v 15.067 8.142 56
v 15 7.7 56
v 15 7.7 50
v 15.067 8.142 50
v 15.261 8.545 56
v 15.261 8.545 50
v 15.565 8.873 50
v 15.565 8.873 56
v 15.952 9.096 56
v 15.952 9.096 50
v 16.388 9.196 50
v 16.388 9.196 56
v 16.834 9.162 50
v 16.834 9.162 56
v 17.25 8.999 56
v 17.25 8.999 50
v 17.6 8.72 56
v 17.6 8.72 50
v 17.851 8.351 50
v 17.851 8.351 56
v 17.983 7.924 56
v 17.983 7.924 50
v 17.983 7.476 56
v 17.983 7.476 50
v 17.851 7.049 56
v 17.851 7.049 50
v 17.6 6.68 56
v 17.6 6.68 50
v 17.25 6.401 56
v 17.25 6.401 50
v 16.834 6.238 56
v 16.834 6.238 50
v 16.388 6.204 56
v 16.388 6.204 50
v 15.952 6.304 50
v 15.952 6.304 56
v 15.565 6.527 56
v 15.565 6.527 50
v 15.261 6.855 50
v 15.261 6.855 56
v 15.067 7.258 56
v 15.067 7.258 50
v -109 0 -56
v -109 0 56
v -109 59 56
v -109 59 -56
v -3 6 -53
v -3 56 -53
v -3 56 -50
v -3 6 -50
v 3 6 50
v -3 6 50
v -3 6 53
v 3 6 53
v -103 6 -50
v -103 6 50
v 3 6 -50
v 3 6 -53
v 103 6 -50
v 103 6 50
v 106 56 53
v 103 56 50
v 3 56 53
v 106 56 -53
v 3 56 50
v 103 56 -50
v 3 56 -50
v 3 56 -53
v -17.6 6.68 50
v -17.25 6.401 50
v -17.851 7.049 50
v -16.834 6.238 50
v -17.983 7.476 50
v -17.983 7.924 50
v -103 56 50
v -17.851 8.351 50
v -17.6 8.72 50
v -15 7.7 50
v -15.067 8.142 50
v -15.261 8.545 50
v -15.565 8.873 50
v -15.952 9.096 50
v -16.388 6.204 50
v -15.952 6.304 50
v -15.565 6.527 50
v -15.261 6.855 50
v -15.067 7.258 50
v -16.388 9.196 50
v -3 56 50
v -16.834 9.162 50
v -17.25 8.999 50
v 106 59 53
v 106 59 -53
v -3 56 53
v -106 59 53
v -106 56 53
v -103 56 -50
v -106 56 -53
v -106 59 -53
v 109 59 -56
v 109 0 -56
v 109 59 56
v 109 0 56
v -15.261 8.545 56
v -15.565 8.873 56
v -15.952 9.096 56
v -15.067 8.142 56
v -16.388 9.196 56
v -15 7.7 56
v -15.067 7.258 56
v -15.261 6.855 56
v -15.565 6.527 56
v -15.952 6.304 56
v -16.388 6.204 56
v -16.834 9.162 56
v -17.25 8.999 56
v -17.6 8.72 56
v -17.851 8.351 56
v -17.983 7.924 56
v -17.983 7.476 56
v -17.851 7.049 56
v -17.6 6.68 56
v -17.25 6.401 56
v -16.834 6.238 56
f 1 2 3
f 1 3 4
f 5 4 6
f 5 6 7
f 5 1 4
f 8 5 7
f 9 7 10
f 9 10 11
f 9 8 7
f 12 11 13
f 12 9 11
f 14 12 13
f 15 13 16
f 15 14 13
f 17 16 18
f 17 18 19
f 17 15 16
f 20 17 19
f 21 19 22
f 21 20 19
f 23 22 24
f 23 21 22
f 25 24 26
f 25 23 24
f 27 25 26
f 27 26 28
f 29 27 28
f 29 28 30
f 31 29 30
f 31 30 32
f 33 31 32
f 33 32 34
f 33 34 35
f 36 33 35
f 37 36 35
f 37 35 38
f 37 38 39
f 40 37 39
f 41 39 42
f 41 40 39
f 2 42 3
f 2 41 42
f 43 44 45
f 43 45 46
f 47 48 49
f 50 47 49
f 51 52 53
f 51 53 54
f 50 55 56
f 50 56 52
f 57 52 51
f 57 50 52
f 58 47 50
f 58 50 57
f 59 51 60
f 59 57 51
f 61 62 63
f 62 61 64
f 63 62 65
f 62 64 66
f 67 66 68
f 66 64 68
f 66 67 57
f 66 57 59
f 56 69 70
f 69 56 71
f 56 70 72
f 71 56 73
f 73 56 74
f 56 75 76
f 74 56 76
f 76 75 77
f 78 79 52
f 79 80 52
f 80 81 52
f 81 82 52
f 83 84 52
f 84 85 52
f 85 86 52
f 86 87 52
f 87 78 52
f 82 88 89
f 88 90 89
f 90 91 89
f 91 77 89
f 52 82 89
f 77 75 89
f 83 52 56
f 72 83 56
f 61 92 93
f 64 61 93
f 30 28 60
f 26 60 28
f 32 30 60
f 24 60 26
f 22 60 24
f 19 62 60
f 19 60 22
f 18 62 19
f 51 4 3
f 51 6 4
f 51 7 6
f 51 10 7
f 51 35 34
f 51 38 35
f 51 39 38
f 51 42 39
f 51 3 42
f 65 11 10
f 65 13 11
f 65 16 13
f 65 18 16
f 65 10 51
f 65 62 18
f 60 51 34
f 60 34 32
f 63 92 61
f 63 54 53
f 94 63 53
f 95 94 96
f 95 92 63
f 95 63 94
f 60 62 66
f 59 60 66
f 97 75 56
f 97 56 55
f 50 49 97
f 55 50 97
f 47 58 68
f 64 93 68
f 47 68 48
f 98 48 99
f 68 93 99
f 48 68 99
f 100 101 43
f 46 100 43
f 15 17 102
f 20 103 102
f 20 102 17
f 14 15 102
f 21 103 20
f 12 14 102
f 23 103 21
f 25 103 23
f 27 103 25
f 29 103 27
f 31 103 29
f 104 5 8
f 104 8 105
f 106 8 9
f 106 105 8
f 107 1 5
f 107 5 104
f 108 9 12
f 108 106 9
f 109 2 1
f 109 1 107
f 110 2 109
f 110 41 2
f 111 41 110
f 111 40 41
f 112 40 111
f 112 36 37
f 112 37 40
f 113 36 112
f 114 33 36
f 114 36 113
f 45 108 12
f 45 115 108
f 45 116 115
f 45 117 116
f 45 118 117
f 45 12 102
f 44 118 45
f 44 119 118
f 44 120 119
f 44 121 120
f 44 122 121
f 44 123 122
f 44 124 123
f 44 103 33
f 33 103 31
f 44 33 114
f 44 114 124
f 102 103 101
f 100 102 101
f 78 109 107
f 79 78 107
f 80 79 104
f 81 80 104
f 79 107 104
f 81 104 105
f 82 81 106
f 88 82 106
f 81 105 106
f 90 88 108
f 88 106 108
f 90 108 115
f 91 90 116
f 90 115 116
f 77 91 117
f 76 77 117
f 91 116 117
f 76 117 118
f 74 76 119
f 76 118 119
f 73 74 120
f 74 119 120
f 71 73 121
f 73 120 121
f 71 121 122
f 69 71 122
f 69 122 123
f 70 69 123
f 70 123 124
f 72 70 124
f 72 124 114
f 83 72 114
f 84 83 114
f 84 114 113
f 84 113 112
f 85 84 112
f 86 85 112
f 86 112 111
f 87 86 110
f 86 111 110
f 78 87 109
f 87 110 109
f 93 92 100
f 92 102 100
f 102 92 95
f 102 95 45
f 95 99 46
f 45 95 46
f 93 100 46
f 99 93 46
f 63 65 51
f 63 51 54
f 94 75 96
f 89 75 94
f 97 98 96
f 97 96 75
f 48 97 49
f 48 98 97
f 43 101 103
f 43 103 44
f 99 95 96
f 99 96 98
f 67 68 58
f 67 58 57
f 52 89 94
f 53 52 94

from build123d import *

# Parameters (mm, degrees)
SKETCH1_W           = 109
SKETCH1_H           = 112
BOSS_EXTRUDE1_DEPTH = 59
CUT_EXTRUDE1_DEPTH  = 53
CUT_EXTRUDE2_DEPTH  = 3
SKETCH6_R           = 1.5
CUT_EXTRUDE28_DEPTH = 6


with BuildPart() as part:
    # Sketch1 → Boss-Extrude1 (new body)
    with BuildSketch(Plane(origin=(0, 0, 0), x_dir=(1, 0, 0), z_dir=(0, 1, 0))):
        with Locations((-54.5, 0)):
            Rectangle(SKETCH1_W, SKETCH1_H)
    boss_extrude1 = extrude(amount=BOSS_EXTRUDE1_DEPTH)

    # Sketch2 → Cut-Extrude1 (cut)
    with BuildSketch(Plane(origin=(0, 59, 0), x_dir=(1, 0, 0), z_dir=(0, 1, 0))):
        Polygon((-103, 50), (-103, -50), (-3, -50), (-3, -53), (0, -53), (0, 53), (-3, 53), (-3, 50), align=None)
    cut_extrude1 = extrude(amount=-CUT_EXTRUDE1_DEPTH, mode=Mode.SUBTRACT)

    # Sketch2<3> → Cut-Extrude2 (cut)
    with BuildSketch(Plane(origin=(0, 59, 0), x_dir=(1, 0, 0), z_dir=(0, 1, 0))):
        Polygon((-106, 53), (-106, -53), (-3, -53), (-3, 0), (-6, 0), (-6, -50), (-103, -50), (-103, 50), (-3, 50), (-3, 53), align=None)
    cut_extrude2 = extrude(amount=-CUT_EXTRUDE2_DEPTH, mode=Mode.SUBTRACT)

    # Sketch6 → Cut-Extrude28 (cut)
    with BuildSketch(Plane.XY.offset(56)):
        with Locations((-16.5, 7.7)):
            Circle(SKETCH6_R)
    cut_extrude28 = extrude(amount=-CUT_EXTRUDE28_DEPTH, mode=Mode.SUBTRACT)

    # Mirror1: Boss-Extrude1, Cut-Extrude1, Cut-Extrude2, Cut-Extrude28 across plane
    add(boss_extrude1.mirror(Plane(origin=(0, 0, 0), x_dir=(0, 0, 1), z_dir=(1, 0, 0))))
    add(cut_extrude1.mirror(Plane(origin=(0, 0, 0), x_dir=(0, 0, 1), z_dir=(1, 0, 0))), mode=Mode.SUBTRACT)
    add(cut_extrude2.mirror(Plane(origin=(0, 0, 0), x_dir=(0, 0, 1), z_dir=(1, 0, 0))), mode=Mode.SUBTRACT)
    add(cut_extrude28.mirror(Plane(origin=(0, 0, 0), x_dir=(0, 0, 1), z_dir=(1, 0, 0))), mode=Mode.SUBTRACT)


solid = part.part
